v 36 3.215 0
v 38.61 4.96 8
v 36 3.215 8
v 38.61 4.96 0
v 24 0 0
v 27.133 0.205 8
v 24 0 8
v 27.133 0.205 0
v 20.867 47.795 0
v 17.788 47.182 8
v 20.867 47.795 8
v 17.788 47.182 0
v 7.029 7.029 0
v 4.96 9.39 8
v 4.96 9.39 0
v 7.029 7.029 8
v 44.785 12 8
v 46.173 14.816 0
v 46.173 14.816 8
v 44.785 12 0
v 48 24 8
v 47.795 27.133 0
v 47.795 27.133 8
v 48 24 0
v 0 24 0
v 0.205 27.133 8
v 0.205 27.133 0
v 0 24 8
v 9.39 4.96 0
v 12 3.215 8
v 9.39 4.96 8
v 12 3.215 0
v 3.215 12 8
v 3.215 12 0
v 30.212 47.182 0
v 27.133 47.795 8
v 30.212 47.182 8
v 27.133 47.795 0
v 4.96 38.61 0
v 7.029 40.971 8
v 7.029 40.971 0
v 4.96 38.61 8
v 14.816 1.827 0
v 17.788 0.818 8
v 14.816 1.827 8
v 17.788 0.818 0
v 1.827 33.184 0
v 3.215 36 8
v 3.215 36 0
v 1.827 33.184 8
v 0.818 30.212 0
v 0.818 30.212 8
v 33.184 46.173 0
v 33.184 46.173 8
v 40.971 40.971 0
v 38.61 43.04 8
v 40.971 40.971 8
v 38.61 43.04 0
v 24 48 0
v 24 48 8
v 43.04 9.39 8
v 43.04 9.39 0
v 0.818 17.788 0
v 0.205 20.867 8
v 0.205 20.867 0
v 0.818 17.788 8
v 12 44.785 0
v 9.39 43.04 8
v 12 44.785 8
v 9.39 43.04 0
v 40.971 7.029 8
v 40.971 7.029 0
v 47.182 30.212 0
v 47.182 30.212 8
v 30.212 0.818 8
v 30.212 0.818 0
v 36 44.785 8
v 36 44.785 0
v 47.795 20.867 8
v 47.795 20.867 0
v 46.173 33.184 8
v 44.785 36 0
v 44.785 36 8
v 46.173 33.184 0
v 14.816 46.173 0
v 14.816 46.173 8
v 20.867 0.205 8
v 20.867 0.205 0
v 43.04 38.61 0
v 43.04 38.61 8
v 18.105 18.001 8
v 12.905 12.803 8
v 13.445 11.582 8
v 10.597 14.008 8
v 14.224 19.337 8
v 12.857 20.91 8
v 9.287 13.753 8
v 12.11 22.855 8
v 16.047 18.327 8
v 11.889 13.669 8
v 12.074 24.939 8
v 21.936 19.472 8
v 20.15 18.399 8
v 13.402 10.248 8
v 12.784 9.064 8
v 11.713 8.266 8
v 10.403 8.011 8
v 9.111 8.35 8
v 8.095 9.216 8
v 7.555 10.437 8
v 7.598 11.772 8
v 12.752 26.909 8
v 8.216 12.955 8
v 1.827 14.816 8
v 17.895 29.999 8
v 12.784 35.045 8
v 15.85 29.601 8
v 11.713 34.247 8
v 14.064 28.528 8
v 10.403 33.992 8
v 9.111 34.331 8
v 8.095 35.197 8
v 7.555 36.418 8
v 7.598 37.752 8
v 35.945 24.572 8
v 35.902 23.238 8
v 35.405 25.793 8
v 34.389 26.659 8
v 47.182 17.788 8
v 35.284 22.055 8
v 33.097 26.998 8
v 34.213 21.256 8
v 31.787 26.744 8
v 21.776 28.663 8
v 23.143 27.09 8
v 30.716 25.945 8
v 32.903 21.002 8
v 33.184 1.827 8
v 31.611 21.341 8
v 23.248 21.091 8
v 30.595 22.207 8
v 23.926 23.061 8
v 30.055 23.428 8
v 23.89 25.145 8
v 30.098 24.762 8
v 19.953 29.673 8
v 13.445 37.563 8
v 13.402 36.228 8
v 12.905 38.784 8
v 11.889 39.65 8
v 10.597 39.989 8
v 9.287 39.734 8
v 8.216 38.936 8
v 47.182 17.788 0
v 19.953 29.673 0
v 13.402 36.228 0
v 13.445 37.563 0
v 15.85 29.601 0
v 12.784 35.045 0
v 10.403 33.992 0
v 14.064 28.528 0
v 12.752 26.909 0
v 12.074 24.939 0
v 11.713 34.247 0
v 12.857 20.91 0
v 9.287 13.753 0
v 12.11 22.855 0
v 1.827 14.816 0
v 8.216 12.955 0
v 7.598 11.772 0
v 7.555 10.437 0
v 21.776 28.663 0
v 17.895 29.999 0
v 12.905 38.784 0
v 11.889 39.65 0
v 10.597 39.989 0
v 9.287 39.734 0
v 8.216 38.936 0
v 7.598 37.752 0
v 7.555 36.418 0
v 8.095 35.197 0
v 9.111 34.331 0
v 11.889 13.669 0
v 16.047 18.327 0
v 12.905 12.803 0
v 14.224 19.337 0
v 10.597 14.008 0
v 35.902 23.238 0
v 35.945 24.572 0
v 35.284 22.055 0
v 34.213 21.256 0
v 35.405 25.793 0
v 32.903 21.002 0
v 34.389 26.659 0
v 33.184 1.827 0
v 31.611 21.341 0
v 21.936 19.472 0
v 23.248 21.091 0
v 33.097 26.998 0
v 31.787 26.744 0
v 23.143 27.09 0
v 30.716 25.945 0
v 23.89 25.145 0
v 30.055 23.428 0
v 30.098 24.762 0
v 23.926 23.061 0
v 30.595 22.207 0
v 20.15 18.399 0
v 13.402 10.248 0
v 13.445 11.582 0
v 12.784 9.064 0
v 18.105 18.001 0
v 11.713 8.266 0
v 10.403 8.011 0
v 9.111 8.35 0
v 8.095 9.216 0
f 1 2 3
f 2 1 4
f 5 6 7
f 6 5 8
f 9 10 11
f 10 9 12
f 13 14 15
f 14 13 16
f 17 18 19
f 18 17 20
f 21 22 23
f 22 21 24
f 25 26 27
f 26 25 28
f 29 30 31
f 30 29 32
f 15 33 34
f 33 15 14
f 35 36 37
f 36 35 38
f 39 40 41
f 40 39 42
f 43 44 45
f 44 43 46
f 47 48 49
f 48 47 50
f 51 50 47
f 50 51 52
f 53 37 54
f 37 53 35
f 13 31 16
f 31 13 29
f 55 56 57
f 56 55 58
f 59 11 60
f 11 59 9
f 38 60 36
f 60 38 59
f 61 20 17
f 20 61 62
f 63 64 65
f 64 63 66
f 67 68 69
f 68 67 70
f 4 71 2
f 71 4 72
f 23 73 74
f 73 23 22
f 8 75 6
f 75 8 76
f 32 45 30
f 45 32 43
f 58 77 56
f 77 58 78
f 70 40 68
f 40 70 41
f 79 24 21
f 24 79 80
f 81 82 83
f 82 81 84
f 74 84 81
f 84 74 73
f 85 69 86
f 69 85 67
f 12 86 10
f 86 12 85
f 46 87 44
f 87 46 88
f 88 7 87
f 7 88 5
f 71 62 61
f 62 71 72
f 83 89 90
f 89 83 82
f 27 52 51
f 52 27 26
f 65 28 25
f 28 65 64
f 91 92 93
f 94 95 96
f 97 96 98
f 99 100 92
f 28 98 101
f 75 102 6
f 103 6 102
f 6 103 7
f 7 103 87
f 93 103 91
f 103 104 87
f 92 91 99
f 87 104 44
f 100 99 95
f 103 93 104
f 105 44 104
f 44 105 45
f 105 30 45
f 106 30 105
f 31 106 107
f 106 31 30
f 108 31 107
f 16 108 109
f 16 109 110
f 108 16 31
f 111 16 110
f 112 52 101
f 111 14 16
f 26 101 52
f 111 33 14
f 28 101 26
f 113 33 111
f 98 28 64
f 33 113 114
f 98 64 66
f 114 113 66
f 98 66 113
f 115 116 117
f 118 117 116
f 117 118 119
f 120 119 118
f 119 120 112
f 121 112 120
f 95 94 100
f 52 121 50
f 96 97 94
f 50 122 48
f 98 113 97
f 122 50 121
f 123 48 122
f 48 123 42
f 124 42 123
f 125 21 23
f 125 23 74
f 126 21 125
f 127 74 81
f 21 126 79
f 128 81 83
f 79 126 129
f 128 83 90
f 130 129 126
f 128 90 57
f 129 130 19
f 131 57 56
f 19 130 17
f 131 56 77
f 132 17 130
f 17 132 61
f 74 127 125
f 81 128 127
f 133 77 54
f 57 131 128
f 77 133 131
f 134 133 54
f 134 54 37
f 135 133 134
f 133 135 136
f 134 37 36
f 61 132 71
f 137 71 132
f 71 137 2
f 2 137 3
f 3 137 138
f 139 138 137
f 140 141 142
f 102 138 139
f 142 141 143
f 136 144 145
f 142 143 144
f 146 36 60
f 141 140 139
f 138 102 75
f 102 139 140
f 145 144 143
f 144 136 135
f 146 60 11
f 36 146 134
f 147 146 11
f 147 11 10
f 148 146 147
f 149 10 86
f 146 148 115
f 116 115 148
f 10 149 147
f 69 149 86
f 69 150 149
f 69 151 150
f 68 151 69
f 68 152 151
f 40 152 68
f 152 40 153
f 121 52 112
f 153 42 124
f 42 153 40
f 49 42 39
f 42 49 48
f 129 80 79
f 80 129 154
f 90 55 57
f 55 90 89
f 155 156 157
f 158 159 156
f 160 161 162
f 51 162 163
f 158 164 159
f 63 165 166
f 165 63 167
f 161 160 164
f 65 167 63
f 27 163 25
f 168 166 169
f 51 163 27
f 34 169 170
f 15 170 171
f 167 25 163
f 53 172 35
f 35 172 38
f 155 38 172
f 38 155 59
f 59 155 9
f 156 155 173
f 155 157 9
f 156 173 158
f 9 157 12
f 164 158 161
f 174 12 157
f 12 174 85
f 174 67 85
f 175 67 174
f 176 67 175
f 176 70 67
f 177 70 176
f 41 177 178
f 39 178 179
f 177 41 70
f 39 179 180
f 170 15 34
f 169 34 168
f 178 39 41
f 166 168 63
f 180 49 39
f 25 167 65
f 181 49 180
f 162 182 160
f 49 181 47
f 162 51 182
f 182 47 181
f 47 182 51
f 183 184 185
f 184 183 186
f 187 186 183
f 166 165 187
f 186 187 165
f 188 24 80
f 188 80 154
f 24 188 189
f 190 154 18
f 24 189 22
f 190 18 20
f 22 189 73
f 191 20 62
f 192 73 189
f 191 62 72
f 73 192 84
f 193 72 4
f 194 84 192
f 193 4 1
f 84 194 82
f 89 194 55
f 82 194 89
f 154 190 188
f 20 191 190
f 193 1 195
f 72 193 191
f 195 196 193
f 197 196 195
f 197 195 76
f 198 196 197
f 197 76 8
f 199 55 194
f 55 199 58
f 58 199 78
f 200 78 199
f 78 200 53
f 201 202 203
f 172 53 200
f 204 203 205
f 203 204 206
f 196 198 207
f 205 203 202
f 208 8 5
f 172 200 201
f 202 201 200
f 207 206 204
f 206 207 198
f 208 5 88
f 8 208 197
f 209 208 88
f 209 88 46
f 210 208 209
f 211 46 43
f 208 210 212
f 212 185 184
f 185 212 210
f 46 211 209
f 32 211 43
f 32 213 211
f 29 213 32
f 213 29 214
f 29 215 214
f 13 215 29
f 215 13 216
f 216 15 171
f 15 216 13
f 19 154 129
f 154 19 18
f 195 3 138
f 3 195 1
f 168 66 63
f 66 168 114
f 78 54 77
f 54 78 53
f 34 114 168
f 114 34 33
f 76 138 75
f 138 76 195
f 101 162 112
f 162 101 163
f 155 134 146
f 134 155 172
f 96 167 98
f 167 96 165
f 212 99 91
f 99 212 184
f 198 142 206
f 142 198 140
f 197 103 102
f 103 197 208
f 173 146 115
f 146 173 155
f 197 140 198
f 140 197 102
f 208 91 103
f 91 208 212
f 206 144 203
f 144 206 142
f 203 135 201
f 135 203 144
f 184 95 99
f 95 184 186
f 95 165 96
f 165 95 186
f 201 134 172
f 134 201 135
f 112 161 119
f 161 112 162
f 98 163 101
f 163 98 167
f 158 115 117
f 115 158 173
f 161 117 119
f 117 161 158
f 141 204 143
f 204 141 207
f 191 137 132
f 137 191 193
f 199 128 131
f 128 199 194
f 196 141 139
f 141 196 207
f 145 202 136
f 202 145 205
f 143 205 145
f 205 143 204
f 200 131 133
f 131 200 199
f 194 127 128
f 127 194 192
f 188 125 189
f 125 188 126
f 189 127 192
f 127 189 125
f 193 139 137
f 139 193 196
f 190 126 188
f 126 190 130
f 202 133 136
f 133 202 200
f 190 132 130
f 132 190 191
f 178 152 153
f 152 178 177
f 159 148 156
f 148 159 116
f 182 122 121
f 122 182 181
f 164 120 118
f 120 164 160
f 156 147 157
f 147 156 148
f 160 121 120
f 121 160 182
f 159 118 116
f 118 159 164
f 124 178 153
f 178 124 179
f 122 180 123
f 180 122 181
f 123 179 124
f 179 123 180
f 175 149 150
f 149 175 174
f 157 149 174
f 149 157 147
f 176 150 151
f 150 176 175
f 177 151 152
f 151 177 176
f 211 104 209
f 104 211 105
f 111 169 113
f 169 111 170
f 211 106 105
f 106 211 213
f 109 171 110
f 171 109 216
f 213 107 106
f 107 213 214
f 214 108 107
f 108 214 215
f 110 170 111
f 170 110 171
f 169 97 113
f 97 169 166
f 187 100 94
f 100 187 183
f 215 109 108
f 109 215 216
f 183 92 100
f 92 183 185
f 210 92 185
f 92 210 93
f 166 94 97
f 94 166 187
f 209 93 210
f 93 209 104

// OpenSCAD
$fn = 32;

// ----------------------------------------------------------------------
// Cam plate: eccentric cam, base R24
// ----------------------------------------------------------------------

// --- parameters (mm) ---
base_r = 24;              // base circle radius
lobe_h = 12;              // cam lobe rise
bore_r = 6;               // shaft bore radius
plate_t = 8;              // plate thickness, Z (extrusion height)
ecc = 6;                  // disc eccentricity
ring_r = 15;              // lightening ring radius
bolt_r = 3;               // lightening hole radius

profile = [[48, 24], [47.795, 27.133], [47.182, 30.212], [46.173, 33.184], [44.785, 36], [43.04, 38.61], [40.971, 40.971], [38.61, 43.04], [36, 44.785], [33.184, 46.173], [30.212, 47.182], [27.133, 47.795], [24, 48], [20.867, 47.795], [17.788, 47.182], [14.816, 46.173], [12, 44.785], [9.39, 43.04], [7.029, 40.971], [4.96, 38.61], [3.215, 36], [1.827, 33.184], [0.818, 30.212], [0.205, 27.133], [0, 24], [0.205, 20.867], [0.818, 17.788], [1.827, 14.816], [3.215, 12], [4.96, 9.39], [7.029, 7.029], [9.39, 4.96], [12, 3.215], [14.816, 1.827], [17.788, 0.818], [20.867, 0.205], [24, 0], [27.133, 0.205], [30.212, 0.818], [33.184, 1.827], [36, 3.215], [38.61, 4.96], [40.971, 7.029], [43.04, 9.39], [44.785, 12], [46.173, 14.816], [47.182, 17.788], [47.795, 20.867]];  // primary outline, 48 points, counter clockwise
void_1 = [[23.89, 25.145], [23.143, 27.09], [21.776, 28.663], [19.953, 29.673], [17.895, 29.999], [15.85, 29.601], [14.064, 28.528], [12.752, 26.909], [12.074, 24.939], [12.11, 22.855], [12.857, 20.91], [14.224, 19.337], [16.047, 18.327], [18.105, 18.001], [20.15, 18.399], [21.936, 19.472], [23.248, 21.091], [23.926, 23.061]];  // shaft bore, 18 points
void_2 = [[35.945, 24.572], [35.405, 25.793], [34.389, 26.659], [33.097, 26.998], [31.787, 26.744], [30.716, 25.945], [30.098, 24.762], [30.055, 23.428], [30.595, 22.207], [31.611, 21.341], [32.903, 21.002], [34.213, 21.256], [35.284, 22.055], [35.902, 23.238]];  // lightening hole 1, 14 points
void_3 = [[13.445, 37.563], [12.905, 38.784], [11.889, 39.65], [10.597, 39.989], [9.287, 39.734], [8.216, 38.936], [7.598, 37.752], [7.555, 36.418], [8.095, 35.197], [9.111, 34.331], [10.403, 33.992], [11.713, 34.247], [12.784, 35.045], [13.402, 36.228]];  // lightening hole 2, 14 points
void_4 = [[13.445, 11.582], [12.905, 12.803], [11.889, 13.669], [10.597, 14.008], [9.287, 13.753], [8.216, 12.955], [7.598, 11.772], [7.555, 10.437], [8.095, 9.216], [9.111, 8.35], [10.403, 8.011], [11.713, 8.266], [12.784, 9.064], [13.402, 10.248]];  // lightening hole 3, 14 points

// --- the one profile operation ---
difference() {
  linear_extrude(height = plate_t) polygon(points = profile);
  translate([0, 0, -1])
    linear_extrude(height = plate_t + 2) polygon(points = void_1);
  translate([0, 0, -1])
    linear_extrude(height = plate_t + 2) polygon(points = void_2);
  translate([0, 0, -1])
    linear_extrude(height = plate_t + 2) polygon(points = void_3);
  translate([0, 0, -1])
    linear_extrude(height = plate_t + 2) polygon(points = void_4);
}
